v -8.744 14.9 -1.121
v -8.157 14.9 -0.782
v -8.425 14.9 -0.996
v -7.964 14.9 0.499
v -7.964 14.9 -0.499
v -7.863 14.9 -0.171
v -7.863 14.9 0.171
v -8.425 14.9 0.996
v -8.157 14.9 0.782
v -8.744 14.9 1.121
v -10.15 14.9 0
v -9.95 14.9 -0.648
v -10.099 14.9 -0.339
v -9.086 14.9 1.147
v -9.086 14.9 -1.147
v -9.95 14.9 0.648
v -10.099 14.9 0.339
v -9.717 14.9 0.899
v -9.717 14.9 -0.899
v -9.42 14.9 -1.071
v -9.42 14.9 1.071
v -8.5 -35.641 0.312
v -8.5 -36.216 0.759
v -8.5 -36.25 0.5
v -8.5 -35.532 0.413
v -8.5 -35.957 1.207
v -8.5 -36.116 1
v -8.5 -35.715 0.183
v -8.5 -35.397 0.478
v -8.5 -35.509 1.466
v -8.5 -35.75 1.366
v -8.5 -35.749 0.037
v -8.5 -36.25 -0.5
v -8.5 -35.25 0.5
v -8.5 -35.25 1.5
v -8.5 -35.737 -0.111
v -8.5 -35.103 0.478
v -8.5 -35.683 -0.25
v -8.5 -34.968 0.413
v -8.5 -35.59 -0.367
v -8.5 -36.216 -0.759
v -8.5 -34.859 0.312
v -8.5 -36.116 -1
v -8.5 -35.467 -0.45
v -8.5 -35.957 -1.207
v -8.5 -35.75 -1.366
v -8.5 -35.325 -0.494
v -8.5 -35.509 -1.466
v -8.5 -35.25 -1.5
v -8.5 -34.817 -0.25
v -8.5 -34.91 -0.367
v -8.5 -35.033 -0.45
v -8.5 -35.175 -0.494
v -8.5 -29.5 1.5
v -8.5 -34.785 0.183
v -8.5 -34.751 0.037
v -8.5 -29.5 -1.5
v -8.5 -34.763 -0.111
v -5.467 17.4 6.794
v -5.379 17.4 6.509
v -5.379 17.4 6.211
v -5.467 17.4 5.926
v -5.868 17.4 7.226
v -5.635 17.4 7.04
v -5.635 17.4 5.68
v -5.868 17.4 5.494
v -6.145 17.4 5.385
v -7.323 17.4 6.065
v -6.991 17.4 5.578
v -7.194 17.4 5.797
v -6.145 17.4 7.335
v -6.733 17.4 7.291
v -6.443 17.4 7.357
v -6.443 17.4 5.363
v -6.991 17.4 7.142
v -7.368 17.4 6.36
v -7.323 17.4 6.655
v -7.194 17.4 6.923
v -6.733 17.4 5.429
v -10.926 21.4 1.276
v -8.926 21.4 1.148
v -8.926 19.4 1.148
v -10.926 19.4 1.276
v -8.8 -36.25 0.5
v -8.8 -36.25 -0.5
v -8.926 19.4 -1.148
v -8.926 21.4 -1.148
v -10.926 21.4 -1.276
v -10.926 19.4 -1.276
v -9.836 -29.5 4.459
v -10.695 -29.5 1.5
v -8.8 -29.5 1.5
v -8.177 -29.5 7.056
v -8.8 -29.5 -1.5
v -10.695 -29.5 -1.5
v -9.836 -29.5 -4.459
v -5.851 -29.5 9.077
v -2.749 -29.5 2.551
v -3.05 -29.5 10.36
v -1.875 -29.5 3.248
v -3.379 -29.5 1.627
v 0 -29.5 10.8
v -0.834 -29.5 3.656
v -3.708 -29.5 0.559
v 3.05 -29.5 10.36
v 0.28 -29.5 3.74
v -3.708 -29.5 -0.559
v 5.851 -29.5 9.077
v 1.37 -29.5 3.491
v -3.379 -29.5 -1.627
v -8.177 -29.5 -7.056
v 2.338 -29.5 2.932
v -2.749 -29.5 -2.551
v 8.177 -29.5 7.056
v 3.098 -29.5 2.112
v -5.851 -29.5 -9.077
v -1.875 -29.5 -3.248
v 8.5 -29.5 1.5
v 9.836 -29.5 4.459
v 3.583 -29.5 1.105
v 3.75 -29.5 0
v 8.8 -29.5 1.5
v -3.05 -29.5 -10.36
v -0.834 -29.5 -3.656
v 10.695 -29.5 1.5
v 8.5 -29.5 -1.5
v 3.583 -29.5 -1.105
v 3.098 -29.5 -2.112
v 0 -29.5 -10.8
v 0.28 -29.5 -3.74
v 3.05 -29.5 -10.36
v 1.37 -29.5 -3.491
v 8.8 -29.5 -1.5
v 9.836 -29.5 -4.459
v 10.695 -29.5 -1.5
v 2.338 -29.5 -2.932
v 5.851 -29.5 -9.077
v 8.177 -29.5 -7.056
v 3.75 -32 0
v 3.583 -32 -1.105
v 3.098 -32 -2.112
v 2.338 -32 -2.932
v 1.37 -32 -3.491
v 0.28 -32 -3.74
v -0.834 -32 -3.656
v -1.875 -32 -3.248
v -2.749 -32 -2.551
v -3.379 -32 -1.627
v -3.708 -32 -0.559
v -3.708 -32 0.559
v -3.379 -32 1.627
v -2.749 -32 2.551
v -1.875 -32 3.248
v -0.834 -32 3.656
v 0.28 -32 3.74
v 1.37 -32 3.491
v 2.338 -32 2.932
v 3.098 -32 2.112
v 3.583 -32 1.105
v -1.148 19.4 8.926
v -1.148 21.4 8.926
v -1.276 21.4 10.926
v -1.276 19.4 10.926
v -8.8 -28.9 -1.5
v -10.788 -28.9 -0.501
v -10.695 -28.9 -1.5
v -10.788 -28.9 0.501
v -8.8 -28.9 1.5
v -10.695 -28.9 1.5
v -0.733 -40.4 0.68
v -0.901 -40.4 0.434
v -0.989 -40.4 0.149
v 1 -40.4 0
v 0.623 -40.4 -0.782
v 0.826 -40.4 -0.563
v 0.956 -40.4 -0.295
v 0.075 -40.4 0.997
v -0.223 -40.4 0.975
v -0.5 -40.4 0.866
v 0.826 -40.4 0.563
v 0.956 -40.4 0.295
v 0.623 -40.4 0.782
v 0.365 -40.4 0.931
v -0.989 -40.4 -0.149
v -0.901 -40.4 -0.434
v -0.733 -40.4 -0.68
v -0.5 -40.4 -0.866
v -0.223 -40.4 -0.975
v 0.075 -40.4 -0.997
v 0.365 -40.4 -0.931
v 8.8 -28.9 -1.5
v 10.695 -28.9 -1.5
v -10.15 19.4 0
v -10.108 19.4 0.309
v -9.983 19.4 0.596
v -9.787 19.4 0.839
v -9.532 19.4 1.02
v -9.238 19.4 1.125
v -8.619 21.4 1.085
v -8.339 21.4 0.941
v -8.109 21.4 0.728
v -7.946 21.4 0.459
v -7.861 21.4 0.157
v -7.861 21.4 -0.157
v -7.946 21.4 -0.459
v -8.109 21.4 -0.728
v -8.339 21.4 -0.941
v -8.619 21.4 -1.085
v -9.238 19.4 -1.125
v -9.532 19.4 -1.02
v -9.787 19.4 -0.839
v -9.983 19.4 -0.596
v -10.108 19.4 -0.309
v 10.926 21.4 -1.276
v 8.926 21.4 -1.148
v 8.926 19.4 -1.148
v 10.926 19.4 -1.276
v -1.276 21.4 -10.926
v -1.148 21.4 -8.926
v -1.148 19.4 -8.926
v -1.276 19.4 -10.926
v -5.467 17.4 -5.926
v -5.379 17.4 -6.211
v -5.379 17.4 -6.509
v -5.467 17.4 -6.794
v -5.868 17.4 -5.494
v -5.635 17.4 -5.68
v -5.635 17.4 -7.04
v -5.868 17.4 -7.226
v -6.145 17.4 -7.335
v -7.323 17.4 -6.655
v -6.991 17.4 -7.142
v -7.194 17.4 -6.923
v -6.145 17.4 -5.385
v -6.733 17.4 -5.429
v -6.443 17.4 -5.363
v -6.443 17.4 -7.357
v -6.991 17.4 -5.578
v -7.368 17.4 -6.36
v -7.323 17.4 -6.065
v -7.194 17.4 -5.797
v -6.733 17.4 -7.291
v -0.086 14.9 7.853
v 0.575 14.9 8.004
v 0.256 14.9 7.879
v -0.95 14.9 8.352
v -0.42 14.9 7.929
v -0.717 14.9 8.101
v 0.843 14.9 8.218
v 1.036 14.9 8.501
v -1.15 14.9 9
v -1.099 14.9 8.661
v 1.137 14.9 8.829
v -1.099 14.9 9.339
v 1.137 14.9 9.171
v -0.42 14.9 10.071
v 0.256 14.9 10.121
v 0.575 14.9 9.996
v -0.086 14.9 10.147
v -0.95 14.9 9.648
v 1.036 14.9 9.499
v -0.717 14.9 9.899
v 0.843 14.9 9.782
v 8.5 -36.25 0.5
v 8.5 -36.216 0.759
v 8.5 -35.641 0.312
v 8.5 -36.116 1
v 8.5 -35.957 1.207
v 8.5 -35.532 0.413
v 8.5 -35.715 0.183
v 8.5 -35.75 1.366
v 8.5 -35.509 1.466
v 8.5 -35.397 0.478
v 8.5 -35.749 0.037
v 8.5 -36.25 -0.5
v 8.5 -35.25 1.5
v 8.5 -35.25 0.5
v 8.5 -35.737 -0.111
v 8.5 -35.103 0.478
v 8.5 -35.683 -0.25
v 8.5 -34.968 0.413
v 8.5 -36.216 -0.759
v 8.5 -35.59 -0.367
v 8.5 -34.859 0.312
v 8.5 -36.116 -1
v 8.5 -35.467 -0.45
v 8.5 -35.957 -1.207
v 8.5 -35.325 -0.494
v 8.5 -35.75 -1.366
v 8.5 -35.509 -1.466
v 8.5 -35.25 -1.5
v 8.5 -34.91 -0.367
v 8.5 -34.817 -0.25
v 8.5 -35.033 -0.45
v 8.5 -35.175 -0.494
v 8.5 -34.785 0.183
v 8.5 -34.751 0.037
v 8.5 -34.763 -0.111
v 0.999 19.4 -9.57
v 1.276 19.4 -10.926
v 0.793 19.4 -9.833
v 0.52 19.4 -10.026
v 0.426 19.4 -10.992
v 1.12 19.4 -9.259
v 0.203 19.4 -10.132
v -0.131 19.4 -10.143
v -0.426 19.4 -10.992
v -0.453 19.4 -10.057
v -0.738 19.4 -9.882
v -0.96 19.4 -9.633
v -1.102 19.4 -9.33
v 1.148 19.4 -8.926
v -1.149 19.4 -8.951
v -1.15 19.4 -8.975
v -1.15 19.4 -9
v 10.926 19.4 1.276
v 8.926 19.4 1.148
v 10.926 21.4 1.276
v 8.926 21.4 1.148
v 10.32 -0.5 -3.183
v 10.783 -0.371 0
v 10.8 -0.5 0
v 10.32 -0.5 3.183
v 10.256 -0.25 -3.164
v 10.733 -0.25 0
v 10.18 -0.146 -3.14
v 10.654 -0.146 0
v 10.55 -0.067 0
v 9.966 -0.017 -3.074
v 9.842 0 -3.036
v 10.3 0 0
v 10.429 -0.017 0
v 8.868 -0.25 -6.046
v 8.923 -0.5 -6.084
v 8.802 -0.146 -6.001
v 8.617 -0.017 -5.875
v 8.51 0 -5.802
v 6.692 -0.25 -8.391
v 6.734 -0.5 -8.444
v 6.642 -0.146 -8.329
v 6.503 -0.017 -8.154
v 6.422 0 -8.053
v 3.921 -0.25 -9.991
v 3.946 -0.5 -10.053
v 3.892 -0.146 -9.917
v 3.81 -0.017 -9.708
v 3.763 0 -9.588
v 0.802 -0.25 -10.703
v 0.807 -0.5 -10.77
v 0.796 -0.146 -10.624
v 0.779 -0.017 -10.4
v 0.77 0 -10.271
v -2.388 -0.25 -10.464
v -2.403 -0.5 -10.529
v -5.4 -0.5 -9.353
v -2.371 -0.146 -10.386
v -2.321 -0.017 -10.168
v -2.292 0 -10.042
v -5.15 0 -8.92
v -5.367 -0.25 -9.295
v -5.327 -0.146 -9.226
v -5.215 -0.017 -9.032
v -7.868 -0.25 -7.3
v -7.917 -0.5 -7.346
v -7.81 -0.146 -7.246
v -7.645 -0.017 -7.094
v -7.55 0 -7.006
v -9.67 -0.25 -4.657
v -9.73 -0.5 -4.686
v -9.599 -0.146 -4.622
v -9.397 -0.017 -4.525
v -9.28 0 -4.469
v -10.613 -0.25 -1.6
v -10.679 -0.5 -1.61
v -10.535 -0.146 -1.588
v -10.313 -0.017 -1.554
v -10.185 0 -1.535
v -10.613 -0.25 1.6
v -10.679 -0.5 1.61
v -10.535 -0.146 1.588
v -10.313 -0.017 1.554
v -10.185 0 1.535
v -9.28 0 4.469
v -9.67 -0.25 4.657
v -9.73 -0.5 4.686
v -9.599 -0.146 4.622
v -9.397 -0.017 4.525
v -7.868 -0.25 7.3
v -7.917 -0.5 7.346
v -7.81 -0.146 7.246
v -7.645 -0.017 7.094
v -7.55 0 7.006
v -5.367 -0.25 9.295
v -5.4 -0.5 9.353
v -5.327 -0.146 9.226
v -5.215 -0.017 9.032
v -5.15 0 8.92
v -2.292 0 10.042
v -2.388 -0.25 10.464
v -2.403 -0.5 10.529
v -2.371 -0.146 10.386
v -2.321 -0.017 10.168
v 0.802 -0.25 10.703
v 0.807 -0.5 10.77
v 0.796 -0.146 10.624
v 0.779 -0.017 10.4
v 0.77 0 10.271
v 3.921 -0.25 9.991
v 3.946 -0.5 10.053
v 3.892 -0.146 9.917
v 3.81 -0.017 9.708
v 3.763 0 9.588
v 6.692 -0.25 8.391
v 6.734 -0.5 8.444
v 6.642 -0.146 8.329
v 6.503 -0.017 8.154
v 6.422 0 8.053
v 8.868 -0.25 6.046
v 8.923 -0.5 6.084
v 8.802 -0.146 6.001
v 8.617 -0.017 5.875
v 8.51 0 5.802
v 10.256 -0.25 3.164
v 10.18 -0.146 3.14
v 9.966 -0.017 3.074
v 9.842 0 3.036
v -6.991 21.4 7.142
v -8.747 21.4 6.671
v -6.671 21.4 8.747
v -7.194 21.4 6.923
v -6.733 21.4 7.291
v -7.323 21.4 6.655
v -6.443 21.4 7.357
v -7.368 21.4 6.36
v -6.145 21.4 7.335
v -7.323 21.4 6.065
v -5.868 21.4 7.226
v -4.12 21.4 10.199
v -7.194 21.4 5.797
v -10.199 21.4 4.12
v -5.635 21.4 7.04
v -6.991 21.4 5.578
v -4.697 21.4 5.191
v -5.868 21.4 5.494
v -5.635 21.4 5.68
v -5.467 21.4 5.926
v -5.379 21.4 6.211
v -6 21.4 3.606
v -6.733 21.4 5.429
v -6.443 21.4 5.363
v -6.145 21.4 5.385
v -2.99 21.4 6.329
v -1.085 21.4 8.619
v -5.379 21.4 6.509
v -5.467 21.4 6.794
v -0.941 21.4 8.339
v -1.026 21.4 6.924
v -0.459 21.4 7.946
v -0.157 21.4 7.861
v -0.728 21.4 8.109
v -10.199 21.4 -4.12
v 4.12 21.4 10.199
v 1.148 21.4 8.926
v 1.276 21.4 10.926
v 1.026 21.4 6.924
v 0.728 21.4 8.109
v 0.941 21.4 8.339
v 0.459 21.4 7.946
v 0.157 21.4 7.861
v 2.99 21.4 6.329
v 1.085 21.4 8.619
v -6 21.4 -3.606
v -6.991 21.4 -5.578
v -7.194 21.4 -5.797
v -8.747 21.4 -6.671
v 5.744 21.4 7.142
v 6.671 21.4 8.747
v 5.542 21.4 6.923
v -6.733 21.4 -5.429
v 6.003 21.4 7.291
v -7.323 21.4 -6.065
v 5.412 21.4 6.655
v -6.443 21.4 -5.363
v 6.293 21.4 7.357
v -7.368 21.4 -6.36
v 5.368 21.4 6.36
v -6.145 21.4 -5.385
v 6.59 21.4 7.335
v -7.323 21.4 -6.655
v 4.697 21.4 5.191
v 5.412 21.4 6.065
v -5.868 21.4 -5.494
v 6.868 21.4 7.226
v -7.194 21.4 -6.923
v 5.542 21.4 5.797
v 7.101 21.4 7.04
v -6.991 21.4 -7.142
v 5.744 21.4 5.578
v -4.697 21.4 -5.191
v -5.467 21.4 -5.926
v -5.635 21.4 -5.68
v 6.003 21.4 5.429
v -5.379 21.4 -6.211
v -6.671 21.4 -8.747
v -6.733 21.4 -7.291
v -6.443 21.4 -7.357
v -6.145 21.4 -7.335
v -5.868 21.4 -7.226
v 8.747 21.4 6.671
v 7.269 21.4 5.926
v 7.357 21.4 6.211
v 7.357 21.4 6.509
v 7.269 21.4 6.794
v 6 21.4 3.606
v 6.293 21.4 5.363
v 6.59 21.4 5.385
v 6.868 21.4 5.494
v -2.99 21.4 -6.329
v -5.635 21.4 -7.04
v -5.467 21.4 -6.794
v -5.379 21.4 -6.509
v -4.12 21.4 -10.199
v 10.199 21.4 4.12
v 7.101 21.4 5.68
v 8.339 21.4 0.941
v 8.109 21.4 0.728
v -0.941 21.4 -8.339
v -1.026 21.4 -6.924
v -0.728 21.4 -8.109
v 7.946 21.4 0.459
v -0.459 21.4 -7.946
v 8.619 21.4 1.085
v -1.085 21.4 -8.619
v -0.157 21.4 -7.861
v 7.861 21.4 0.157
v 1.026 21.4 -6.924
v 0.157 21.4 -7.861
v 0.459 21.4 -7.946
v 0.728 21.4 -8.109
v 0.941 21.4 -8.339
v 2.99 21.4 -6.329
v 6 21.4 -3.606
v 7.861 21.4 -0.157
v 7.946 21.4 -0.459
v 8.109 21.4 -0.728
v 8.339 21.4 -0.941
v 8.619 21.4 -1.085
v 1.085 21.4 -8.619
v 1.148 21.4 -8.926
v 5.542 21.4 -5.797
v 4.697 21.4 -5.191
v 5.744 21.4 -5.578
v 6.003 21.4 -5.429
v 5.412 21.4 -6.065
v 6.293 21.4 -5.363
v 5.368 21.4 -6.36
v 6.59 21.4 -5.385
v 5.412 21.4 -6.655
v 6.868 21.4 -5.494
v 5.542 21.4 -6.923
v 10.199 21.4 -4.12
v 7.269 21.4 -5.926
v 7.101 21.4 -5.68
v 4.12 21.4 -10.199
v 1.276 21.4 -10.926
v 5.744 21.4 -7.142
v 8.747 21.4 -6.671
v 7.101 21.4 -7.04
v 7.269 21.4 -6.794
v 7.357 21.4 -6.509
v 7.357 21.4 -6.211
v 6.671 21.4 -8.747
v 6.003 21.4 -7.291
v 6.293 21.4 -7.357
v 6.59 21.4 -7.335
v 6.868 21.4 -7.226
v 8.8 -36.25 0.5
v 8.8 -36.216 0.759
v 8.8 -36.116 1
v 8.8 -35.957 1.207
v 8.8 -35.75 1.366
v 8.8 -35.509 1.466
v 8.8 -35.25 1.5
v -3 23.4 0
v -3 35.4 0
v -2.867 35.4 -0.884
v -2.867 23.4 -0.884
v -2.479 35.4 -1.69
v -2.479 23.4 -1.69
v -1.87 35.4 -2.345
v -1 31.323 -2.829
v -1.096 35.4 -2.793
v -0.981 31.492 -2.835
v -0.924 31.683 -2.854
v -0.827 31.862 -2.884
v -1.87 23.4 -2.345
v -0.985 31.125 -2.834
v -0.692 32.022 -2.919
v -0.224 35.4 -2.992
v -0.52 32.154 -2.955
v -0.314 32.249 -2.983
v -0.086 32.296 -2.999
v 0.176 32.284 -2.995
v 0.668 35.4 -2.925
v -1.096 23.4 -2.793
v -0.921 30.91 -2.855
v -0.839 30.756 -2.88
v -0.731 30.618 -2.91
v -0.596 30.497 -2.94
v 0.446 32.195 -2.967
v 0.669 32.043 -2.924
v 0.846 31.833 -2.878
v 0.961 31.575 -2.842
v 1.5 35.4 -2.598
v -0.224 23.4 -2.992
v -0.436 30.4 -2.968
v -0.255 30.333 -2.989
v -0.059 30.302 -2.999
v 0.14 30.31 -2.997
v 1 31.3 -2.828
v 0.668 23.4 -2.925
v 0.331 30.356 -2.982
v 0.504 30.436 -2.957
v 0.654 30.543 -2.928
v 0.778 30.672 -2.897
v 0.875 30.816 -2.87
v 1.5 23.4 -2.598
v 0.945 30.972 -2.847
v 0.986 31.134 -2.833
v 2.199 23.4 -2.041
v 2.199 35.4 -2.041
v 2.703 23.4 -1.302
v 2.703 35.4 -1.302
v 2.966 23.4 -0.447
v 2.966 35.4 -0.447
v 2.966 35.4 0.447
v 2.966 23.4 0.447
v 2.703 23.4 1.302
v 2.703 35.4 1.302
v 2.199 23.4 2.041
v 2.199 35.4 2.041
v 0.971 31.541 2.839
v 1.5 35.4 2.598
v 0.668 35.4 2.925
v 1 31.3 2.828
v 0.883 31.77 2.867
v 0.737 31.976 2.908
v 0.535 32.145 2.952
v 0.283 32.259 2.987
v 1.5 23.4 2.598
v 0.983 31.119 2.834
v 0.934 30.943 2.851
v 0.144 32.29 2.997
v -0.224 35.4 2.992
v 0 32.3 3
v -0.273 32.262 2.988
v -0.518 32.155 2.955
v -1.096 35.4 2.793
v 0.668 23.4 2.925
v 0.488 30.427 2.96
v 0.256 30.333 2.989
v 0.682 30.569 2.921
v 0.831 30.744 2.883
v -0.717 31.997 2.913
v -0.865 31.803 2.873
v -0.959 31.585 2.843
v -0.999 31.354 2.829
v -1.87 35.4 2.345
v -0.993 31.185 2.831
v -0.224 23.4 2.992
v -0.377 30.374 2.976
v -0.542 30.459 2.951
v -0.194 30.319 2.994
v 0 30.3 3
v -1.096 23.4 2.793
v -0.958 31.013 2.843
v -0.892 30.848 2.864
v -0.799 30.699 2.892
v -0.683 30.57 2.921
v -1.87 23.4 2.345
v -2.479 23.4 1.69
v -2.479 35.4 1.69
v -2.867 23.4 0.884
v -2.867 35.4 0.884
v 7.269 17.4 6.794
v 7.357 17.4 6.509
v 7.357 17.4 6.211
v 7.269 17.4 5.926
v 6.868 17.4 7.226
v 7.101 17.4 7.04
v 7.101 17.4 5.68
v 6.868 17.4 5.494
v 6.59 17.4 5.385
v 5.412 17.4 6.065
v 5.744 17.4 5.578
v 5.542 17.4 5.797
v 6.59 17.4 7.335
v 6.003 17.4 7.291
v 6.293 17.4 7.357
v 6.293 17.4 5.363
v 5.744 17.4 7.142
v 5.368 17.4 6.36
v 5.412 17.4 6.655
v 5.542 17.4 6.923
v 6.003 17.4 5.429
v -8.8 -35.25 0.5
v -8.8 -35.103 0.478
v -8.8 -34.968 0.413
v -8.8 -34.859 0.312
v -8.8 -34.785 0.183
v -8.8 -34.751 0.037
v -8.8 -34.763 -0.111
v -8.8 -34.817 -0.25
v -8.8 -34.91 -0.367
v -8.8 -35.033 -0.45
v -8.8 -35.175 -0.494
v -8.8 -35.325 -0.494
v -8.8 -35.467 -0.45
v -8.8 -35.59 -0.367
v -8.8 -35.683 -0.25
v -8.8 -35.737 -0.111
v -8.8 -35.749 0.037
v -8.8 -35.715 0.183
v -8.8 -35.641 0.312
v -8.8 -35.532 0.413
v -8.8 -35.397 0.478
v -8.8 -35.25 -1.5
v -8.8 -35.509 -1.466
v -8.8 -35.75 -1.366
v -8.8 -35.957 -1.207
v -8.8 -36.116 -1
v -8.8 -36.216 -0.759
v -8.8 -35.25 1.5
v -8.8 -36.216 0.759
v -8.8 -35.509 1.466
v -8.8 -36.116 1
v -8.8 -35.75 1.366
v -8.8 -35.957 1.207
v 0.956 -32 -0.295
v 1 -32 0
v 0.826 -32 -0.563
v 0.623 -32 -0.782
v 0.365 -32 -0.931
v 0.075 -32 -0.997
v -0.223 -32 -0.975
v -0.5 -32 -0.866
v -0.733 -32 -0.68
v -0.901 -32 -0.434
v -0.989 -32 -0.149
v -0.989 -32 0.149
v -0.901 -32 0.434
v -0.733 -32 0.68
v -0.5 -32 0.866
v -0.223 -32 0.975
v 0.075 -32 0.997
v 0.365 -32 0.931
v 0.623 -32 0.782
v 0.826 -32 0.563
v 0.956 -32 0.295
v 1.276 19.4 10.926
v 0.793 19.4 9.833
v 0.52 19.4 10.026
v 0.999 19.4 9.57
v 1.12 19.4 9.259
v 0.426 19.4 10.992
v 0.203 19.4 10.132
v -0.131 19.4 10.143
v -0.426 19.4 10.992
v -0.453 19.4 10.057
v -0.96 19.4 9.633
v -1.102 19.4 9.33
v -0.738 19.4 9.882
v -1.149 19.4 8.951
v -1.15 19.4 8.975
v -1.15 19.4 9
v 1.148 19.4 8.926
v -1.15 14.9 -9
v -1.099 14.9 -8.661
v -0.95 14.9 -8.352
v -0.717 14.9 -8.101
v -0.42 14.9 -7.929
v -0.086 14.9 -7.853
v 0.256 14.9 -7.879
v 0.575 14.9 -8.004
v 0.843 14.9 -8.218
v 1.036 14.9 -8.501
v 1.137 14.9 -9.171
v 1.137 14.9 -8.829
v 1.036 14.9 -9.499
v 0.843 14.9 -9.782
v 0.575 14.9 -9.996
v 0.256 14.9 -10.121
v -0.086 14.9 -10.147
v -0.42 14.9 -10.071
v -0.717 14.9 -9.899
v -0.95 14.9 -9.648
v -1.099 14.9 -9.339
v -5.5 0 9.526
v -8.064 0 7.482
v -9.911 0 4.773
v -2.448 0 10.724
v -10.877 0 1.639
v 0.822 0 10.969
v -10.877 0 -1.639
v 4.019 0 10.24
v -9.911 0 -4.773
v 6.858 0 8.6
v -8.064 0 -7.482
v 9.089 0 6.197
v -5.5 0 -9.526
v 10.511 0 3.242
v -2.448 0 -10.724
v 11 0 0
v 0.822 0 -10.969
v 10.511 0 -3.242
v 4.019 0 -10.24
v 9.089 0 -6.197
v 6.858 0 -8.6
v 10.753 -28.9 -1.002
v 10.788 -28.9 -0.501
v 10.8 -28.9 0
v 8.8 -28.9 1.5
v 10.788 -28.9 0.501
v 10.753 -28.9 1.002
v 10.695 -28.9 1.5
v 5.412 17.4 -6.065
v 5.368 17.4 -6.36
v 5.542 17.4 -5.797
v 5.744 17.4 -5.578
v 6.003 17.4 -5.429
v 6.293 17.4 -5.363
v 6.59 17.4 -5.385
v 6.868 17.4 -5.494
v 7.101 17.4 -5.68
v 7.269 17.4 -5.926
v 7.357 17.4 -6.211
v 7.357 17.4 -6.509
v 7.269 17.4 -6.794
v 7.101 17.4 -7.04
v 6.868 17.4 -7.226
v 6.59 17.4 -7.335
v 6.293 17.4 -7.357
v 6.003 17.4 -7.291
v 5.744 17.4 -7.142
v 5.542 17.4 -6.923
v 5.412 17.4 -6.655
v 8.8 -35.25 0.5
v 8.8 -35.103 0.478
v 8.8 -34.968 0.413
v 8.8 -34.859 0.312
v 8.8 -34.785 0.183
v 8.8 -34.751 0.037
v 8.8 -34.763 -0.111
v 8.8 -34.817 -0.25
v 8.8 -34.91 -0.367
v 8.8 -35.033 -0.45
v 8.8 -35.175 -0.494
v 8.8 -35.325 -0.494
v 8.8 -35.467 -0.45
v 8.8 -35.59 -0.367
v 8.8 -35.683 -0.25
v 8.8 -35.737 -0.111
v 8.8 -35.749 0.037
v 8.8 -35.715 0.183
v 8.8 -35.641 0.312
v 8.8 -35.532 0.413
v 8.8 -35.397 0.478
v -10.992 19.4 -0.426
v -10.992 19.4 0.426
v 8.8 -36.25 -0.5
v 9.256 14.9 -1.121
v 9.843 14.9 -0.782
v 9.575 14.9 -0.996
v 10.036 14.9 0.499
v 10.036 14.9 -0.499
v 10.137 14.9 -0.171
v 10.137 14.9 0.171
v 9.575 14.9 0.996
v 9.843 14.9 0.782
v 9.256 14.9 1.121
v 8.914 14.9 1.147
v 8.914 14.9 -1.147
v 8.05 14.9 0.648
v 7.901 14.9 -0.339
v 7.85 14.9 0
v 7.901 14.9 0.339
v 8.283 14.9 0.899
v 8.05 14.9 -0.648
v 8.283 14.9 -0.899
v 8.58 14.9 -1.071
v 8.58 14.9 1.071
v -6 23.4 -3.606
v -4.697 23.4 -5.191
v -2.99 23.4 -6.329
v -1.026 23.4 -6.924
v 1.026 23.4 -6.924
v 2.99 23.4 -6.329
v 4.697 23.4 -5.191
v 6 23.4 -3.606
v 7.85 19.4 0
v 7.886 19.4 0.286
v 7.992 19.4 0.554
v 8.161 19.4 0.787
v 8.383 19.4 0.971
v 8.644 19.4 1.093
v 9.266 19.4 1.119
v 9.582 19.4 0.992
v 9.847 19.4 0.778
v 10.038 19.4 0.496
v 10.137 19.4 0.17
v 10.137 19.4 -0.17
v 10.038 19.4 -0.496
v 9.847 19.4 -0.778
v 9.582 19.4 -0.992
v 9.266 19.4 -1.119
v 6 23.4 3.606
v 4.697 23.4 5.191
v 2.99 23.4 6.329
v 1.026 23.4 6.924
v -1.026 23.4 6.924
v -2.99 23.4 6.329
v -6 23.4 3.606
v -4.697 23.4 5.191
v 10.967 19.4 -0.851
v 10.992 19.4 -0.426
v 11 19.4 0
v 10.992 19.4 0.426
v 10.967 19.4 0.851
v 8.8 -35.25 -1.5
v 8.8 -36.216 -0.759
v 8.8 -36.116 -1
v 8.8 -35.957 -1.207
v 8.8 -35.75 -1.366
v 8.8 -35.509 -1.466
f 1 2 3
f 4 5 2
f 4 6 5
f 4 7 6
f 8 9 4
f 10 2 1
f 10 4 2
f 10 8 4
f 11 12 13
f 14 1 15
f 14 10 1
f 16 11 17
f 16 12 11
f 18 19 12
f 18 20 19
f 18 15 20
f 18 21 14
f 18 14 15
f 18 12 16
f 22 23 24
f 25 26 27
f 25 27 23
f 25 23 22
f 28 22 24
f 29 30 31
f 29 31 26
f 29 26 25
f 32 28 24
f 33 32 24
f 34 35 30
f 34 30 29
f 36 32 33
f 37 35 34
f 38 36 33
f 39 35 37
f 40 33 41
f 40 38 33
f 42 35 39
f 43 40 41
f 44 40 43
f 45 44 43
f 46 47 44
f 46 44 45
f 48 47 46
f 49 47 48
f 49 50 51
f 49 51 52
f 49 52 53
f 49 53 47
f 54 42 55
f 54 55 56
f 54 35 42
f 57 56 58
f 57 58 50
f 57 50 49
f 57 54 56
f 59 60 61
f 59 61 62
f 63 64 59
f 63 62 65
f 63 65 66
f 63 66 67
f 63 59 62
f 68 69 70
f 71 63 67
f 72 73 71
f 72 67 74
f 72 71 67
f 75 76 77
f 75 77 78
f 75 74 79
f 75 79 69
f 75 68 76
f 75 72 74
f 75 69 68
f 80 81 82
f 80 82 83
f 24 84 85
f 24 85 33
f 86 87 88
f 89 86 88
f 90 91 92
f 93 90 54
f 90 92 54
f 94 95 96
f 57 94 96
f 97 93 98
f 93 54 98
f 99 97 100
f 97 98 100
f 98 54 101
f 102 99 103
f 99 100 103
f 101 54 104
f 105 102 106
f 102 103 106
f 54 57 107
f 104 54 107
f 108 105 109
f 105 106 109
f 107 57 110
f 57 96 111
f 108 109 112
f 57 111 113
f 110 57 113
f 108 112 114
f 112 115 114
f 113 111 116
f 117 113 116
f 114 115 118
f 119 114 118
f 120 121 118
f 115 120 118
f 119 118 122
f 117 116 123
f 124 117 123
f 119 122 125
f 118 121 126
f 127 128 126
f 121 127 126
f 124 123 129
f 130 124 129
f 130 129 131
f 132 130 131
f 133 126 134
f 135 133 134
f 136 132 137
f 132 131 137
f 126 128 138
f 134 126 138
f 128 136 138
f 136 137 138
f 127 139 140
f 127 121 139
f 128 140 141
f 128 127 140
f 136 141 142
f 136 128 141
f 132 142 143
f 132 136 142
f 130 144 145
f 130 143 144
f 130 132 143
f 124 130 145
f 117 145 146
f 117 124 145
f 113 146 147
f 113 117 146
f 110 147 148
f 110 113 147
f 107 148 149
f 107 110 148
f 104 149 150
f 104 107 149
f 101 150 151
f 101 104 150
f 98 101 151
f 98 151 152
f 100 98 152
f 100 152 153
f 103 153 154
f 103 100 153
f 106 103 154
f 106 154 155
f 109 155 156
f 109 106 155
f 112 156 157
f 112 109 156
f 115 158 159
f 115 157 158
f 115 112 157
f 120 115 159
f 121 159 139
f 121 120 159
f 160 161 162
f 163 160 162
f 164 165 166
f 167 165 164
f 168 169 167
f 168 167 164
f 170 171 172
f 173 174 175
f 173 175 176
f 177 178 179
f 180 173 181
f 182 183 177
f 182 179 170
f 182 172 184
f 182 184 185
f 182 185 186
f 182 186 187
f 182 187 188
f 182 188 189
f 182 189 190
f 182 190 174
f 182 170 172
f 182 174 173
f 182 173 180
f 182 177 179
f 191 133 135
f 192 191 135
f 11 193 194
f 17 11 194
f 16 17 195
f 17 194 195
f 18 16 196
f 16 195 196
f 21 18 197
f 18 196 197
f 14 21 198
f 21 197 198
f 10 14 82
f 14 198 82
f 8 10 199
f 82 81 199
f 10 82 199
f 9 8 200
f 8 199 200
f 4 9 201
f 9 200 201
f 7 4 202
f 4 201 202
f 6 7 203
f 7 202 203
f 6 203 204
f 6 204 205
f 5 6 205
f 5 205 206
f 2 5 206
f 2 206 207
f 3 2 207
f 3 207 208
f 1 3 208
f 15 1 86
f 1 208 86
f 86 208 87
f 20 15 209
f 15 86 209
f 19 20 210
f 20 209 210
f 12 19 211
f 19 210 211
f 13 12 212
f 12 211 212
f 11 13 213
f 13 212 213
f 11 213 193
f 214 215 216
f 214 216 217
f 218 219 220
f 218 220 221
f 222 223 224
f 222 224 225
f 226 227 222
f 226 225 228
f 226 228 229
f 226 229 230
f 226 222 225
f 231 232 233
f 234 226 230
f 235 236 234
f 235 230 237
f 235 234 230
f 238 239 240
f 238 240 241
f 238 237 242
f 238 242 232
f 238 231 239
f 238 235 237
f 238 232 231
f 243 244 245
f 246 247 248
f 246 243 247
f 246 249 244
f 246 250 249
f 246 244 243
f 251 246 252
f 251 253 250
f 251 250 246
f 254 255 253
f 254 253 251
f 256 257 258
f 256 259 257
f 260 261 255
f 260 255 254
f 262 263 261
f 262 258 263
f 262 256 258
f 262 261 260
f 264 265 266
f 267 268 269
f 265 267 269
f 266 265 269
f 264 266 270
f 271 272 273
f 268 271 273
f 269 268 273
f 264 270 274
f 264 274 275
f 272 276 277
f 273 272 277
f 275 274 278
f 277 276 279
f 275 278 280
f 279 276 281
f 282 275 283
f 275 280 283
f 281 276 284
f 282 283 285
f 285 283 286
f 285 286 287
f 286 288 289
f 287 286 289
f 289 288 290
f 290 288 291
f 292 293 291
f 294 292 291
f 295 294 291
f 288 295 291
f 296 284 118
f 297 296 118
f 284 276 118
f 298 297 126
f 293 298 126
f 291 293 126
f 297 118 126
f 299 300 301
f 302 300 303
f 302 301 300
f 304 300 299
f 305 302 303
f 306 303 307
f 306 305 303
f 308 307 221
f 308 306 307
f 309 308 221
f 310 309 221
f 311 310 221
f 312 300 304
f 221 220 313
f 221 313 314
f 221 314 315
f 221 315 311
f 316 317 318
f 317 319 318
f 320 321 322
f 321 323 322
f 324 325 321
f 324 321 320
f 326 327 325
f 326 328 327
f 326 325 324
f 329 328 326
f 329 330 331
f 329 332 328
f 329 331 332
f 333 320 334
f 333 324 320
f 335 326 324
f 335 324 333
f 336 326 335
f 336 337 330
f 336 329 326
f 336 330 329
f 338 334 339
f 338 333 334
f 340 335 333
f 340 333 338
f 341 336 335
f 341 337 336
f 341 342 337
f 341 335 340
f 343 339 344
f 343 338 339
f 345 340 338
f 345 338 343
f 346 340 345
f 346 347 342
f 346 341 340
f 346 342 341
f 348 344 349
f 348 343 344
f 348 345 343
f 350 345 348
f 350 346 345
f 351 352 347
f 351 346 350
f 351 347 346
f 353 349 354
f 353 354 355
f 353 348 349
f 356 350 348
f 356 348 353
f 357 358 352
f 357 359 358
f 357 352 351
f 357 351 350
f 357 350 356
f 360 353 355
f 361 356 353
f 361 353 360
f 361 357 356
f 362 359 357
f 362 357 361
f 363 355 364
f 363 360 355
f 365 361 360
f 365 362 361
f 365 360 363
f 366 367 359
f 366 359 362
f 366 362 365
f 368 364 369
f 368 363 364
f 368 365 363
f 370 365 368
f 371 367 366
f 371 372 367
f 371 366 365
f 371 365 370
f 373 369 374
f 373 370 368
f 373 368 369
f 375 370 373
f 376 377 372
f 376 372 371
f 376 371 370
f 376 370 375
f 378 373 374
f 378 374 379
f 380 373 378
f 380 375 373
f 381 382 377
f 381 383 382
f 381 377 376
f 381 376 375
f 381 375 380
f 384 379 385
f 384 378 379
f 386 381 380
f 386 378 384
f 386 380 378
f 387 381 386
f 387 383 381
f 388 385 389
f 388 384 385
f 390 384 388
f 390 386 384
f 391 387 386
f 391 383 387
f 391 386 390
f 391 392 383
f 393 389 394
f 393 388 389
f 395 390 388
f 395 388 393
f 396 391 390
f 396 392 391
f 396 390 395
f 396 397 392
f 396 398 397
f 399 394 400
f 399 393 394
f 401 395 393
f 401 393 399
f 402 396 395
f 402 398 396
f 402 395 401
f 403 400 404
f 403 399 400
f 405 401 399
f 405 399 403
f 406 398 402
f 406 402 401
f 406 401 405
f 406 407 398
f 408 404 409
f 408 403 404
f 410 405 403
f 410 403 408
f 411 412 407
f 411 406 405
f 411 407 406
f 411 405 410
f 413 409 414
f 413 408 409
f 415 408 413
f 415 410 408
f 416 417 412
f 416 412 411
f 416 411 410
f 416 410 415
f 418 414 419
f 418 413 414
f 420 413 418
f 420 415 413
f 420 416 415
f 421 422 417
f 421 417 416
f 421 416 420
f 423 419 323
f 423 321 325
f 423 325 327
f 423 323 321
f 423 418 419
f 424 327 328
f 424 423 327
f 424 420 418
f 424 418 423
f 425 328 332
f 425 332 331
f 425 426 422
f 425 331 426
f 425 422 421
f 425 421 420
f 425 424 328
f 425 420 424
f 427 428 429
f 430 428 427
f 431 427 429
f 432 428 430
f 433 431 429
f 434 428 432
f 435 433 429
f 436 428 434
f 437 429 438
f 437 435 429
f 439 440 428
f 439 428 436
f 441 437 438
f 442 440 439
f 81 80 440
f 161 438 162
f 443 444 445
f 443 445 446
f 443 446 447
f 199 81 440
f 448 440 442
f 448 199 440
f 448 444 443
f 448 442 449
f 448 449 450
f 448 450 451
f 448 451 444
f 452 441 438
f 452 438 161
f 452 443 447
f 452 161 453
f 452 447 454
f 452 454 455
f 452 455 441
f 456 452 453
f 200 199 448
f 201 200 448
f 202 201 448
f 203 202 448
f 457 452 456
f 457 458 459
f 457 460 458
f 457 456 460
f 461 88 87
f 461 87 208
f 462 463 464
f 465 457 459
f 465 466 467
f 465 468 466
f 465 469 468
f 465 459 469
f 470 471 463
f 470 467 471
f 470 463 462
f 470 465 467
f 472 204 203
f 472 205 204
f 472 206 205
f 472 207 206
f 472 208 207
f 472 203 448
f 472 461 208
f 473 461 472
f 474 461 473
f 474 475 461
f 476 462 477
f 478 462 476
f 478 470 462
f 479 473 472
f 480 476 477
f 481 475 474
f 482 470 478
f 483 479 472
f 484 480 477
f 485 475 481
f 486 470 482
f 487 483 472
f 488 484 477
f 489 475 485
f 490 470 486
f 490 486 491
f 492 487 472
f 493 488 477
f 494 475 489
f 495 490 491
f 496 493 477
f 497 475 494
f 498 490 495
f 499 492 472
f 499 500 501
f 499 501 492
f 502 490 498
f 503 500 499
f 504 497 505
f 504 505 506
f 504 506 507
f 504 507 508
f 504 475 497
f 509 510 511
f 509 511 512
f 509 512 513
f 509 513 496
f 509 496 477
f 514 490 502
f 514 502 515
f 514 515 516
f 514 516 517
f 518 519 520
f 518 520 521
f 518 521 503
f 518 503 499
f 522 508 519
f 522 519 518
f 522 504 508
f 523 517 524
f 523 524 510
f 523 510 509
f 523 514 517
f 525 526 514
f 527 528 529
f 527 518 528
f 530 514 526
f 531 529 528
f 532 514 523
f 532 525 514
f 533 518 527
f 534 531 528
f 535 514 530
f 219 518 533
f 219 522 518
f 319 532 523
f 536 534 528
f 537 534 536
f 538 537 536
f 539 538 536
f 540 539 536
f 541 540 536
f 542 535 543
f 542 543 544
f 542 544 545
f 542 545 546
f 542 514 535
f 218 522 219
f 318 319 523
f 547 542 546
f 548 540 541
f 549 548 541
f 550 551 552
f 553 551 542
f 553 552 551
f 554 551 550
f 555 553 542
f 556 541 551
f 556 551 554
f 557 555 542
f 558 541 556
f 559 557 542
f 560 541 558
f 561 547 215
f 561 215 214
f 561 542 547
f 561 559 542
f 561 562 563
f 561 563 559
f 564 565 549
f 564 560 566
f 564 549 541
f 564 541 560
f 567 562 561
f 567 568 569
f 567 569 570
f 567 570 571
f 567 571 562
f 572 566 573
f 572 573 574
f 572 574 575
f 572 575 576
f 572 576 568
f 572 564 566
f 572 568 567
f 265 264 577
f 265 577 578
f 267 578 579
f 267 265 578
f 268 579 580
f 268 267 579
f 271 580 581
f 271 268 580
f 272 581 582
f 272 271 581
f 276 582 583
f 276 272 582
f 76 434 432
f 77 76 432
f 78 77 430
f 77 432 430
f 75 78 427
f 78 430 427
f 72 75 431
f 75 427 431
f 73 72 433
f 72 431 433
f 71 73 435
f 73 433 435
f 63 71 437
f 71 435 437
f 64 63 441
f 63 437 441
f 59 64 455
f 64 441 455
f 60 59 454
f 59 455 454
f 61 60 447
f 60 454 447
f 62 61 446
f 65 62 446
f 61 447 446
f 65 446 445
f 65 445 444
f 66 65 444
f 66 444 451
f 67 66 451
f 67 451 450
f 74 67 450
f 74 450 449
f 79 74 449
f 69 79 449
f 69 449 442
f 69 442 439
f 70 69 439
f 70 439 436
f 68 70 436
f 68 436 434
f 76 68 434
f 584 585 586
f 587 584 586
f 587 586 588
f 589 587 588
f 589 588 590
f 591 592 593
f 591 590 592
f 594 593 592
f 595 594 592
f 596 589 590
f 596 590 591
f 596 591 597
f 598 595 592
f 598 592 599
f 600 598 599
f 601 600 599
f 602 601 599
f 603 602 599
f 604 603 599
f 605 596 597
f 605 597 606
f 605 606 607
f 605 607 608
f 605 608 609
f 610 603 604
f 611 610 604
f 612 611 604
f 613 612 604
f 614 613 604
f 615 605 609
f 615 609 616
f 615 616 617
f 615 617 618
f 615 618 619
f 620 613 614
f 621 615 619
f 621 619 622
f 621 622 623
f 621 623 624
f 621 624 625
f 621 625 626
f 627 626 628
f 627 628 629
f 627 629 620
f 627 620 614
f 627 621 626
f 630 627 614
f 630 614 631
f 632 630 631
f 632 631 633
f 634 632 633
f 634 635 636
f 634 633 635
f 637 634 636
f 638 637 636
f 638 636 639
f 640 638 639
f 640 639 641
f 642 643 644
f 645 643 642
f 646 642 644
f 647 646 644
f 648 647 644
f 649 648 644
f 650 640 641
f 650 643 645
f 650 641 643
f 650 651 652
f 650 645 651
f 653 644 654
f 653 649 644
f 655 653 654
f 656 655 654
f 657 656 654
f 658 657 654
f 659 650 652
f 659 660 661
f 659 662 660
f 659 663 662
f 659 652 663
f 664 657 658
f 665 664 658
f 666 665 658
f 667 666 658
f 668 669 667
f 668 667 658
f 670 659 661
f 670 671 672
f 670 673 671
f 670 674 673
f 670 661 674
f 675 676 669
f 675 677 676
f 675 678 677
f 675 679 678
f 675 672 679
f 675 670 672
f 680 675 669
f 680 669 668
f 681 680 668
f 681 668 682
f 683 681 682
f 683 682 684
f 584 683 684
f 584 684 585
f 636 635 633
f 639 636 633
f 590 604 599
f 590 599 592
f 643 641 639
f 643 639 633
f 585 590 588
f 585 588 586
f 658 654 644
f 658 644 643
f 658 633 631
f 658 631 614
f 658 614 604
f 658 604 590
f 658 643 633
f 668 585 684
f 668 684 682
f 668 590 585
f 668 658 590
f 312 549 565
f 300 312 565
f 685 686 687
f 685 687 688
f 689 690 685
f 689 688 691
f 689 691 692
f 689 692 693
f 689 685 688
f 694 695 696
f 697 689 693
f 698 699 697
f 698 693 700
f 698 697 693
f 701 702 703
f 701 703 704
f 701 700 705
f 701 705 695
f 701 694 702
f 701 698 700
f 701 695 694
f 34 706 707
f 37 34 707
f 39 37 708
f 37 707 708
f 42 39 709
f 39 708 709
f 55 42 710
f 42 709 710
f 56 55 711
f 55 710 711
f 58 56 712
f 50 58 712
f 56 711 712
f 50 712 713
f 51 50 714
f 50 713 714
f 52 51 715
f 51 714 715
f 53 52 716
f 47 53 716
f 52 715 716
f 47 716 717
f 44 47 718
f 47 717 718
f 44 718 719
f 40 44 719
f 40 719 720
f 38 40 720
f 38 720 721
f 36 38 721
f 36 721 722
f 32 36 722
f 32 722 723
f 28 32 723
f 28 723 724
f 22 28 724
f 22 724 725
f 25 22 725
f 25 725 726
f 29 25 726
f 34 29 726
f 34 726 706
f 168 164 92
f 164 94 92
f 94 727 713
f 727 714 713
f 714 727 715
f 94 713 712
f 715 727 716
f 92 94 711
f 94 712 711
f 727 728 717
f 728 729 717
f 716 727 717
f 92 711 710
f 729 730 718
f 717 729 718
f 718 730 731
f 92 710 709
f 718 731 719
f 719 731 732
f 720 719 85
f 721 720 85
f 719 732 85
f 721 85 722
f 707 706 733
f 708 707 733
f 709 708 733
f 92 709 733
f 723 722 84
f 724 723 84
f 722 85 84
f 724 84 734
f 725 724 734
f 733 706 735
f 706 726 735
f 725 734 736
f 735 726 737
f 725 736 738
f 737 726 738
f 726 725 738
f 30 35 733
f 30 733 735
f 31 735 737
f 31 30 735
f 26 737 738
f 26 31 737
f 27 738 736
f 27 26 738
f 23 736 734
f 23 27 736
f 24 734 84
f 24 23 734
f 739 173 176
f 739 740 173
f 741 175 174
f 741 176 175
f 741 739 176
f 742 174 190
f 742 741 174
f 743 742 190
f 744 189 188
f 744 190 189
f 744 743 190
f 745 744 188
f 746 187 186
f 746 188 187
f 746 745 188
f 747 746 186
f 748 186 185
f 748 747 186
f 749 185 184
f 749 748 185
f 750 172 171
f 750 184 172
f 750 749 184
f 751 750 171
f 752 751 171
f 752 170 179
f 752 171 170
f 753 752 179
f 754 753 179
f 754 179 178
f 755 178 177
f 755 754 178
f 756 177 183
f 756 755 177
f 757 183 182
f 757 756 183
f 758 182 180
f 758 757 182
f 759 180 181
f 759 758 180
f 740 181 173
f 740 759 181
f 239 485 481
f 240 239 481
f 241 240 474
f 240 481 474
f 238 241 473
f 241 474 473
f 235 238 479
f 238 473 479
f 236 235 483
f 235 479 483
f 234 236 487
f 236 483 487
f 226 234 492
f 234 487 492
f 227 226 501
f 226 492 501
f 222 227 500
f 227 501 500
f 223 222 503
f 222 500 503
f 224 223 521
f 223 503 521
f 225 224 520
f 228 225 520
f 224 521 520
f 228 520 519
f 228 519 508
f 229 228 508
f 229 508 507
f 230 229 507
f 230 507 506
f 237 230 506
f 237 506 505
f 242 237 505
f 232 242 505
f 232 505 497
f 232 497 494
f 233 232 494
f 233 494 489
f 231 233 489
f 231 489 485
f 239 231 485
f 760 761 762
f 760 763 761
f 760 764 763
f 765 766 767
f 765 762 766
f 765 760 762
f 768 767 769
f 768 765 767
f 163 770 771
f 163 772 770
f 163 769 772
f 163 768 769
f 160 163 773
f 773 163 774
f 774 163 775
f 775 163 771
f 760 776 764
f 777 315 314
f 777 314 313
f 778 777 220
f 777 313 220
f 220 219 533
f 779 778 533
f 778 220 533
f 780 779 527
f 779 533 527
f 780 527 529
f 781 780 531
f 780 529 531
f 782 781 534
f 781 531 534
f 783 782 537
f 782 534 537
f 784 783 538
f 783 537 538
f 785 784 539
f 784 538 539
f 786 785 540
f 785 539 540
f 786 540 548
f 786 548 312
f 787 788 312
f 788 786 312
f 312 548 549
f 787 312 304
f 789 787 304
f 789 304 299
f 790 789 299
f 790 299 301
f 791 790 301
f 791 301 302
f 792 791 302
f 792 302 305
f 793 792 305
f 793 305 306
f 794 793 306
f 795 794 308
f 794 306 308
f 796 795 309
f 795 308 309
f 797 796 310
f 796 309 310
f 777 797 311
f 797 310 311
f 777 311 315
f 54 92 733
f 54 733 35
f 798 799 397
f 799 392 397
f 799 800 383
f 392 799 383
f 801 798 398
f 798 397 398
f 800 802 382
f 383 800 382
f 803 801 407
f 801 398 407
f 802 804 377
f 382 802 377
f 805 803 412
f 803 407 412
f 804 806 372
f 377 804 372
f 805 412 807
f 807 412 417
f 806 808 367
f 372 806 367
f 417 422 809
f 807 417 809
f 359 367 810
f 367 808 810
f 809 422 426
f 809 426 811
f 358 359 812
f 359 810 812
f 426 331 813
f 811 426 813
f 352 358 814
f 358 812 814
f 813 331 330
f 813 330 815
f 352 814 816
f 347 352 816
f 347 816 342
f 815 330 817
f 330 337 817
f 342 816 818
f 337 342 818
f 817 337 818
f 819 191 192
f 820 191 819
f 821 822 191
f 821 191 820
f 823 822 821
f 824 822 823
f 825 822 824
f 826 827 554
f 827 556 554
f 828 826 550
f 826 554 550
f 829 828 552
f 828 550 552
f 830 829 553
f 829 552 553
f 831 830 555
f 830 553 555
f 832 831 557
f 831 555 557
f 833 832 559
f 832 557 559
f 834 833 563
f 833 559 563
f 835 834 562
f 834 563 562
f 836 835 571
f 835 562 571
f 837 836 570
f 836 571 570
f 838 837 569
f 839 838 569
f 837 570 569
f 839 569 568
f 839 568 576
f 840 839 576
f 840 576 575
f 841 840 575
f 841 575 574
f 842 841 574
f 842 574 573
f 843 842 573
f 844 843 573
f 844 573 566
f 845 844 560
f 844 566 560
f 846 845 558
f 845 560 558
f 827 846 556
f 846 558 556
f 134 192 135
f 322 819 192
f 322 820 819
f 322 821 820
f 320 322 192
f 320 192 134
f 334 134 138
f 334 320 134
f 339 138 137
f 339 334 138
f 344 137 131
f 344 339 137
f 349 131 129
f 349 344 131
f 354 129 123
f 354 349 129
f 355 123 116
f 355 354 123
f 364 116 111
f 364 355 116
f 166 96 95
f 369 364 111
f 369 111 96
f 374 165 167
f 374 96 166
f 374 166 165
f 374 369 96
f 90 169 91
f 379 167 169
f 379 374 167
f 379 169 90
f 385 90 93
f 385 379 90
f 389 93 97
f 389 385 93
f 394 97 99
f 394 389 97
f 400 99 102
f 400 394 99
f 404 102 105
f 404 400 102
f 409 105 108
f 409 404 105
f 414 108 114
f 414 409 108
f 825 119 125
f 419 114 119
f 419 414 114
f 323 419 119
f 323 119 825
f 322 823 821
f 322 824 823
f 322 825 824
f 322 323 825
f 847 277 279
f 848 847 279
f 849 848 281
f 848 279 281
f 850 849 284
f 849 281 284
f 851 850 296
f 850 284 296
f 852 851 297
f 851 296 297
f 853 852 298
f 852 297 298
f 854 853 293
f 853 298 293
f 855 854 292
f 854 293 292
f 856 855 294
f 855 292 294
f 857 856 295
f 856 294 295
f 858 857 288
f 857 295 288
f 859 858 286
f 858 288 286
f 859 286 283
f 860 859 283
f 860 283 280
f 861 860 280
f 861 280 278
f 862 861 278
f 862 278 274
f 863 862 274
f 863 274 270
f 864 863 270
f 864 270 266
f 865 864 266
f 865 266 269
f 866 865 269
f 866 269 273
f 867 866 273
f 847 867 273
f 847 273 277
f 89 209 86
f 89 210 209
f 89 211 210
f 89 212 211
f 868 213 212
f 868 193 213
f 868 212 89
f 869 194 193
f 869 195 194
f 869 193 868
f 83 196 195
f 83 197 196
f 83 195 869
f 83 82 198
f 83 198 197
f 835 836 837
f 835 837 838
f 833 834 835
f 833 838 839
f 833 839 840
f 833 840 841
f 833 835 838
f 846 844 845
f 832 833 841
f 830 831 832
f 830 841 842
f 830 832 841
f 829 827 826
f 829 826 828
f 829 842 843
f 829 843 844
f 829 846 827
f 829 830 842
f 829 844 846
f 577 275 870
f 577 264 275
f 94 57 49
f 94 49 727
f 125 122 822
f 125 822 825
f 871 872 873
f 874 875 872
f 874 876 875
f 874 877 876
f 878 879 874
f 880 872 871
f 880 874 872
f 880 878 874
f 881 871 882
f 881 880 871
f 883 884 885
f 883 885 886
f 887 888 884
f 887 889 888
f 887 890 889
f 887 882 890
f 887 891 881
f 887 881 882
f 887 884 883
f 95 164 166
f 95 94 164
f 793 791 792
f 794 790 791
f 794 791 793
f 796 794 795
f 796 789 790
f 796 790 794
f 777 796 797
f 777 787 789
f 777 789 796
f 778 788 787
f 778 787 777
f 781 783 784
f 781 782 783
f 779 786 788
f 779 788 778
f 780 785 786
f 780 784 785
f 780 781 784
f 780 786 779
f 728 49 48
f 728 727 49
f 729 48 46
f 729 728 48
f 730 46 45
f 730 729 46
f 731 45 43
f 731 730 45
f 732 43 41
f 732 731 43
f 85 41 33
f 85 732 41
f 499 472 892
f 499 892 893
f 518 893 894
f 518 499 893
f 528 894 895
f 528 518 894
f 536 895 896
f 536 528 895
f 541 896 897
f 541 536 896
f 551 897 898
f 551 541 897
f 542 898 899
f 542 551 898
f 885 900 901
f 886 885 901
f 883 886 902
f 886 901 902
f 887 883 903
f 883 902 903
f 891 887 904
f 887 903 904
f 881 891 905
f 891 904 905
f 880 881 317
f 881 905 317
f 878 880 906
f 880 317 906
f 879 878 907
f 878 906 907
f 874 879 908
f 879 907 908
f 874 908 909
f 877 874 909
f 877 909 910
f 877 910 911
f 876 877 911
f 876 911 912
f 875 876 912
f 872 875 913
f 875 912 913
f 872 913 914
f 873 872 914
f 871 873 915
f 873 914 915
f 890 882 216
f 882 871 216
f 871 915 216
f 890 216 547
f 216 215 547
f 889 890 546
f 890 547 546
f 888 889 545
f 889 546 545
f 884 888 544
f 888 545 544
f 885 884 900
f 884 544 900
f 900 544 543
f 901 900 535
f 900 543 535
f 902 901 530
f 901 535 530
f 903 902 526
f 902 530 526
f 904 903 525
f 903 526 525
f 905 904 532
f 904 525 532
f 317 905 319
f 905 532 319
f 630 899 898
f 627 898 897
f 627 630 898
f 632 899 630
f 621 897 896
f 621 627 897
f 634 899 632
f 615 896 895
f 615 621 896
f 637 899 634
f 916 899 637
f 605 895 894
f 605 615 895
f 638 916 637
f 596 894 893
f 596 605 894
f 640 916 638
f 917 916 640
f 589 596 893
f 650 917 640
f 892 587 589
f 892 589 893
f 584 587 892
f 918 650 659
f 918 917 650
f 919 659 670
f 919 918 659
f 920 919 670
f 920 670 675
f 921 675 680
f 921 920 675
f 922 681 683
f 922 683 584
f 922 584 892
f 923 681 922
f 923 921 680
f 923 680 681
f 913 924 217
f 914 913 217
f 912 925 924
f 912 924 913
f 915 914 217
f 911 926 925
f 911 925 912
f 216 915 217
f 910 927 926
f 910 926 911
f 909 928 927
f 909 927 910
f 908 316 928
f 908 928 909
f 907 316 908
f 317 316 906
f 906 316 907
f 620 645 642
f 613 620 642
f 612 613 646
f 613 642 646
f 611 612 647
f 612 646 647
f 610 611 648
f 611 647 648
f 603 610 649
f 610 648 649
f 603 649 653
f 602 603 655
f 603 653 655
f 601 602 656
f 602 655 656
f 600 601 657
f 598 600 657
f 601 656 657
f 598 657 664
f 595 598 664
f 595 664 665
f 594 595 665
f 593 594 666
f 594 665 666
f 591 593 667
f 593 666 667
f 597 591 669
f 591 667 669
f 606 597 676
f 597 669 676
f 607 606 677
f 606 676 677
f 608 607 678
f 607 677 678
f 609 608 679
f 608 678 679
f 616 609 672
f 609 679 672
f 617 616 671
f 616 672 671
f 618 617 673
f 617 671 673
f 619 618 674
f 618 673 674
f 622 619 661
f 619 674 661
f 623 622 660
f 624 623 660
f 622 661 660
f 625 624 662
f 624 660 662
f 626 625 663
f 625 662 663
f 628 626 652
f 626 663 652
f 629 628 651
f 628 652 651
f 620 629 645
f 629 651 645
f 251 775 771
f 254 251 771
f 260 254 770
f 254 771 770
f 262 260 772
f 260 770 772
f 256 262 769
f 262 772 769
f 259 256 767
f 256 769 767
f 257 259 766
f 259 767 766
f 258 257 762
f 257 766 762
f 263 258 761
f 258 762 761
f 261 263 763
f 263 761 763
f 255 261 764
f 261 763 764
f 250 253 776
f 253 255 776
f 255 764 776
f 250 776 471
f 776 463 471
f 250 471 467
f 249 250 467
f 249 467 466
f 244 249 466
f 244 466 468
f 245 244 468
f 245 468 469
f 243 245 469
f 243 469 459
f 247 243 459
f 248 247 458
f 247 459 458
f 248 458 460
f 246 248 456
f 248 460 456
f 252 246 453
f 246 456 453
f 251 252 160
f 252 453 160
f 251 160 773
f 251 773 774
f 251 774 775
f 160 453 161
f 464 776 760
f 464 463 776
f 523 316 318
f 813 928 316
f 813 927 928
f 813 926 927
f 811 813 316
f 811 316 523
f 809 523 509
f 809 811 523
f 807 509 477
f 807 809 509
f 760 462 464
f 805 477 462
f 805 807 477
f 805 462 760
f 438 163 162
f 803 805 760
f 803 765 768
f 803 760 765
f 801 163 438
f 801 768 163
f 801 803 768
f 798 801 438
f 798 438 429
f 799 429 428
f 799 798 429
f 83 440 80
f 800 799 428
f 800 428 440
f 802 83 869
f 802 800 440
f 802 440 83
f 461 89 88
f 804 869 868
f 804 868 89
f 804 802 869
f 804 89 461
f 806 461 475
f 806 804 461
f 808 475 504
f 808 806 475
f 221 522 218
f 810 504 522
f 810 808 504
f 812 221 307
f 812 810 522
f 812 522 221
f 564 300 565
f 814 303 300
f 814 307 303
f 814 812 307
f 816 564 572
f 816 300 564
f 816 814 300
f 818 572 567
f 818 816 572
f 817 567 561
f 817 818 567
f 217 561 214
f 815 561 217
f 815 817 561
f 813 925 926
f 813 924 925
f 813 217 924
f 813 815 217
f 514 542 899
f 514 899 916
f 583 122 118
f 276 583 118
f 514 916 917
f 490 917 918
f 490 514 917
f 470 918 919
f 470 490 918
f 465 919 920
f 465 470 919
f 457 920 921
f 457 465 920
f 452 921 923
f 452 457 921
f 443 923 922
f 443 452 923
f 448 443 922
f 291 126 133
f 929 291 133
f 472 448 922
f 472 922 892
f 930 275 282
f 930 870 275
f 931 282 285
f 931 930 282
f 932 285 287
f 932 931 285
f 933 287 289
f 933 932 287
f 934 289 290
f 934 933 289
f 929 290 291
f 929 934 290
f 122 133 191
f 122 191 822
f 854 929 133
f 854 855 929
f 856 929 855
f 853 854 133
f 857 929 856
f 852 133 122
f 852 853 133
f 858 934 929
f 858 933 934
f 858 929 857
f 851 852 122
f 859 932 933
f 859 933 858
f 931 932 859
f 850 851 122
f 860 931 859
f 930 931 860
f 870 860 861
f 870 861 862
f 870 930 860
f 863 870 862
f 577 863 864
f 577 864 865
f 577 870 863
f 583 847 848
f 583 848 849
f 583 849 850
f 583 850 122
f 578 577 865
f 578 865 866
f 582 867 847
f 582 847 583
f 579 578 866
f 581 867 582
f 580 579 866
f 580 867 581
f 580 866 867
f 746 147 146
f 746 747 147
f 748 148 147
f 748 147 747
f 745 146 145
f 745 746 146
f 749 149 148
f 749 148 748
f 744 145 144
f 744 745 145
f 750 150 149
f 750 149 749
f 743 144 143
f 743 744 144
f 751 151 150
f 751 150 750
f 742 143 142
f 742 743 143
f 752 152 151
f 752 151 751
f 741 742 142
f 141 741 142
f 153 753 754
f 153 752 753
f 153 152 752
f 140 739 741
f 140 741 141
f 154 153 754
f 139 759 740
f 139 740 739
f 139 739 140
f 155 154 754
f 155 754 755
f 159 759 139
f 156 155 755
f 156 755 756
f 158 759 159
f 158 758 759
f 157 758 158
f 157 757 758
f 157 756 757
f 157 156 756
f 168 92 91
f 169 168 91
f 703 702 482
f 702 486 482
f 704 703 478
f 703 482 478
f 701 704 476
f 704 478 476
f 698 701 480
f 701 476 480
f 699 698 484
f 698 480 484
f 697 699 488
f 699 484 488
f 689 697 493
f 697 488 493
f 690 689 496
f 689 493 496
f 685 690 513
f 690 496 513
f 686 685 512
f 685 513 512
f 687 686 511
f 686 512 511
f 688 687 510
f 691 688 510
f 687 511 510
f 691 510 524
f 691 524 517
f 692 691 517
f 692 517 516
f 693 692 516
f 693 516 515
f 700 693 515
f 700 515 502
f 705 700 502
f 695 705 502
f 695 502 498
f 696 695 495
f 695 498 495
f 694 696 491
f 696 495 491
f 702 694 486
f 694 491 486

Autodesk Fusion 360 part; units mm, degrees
sketch "Sketch1" plane through (0, 0, 0) normal (0, 1, 0) x (1, 0, 0)
  circle A0 centre (0, 0) radius 11
  circle A1 centre (0, 0) radius 10.8
  dimension "d1" = 22
  dimension "d4" = 21.6
extrude "Extrude1" add sketch "Sketch1" along normal blind 21.4 contours A0 | A1 makes body 1
extrude "Extrude2" add sketch "Sketch1" against normal blind 29.5 separate body contours A1 makes body 2
sketch "Sketch2" plane through (0, -29.5, 0) normal (0, -1, 0) x (1, 0, 0)
  circle A0 centre (0, 0) radius 10.8
  circle A1 centre (0, 0) radius 3.75
  circle A2 centre (0, 0) radius 1
  dimension "d7" = 7.5
  dimension "d8" = 2
extrude "Extrude3" add sketch "Sketch2" along normal blind 2.5 contours A1 | A2 bodies 2
sketch "Sketch3" plane through (0, -29.5, 0) normal (0, -1, 0) x (1, 0, 0)
  circle A0 centre (0, 0) radius 3.75
  circle A1 centre (0, 0) radius 10.8
  line L0 (0, 0) -> (10.8, 0) construction
  line L1 (0, 0) -> (0, 10.8) construction
  line L2 (8.5, -1.5) -> (8.8, -1.5)
  line L3 (8.8, -1.5) -> (8.8, 1.5)
  line L4 (8.8, 1.5) -> (8.5, 1.5)
  line L5 (8.5, 1.5) -> (8.5, -1.5)
  line L6 (8.5, -1.5) -> (8.8, 1.5) construction
  line L7 (8.8, -1.5) -> (8.5, 1.5) construction
  line L8 (-8.8, -1.5) -> (-8.5, 1.5) construction
  line L9 (-8.5, 1.5) -> (-8.5, -1.5)
  line L10 (-8.8, -1.5) -> (-8.8, 1.5)
  line L11 (0, 0) -> (-10.8, 0) construction
  line L12 (-8.5, -1.5) -> (-8.8, 1.5) construction
  line L13 (-8.8, 1.5) -> (-8.5, 1.5)
  line L14 (-8.5, -1.5) -> (-8.8, -1.5)
  line L15 (-8.8, 1.5) -> (-10.6953, 1.5)
  line L16 (-8.8, -1.5) -> (-10.6953, -1.5)
  circle A2 centre (0, 0) radius 10.8
  line L17 (8.8, 1.5) -> (10.6953, 1.5)
  line L18 (8.8, -1.5) -> (10.6953, -1.5)
  point P0 (8.65, 0)
  dimension "d14" = 0.3
  dimension "d15" = 3
  dimension "d16" = 2
extrude "Extrude5" add sketch "Sketch3" along normal blind 6.75 contours L2 L3 L4 L5 | L9 L10 L13 L14 bodies 2
sketch "Sketch4" plane through (-8.8, 0, 0) normal (-1, 0, 0) x (0, 0, 1)
  line L0 (1.5, -29.5) -> (-1.5, -29.5)
  line L1 (-1.5, -29.5) -> (-1.5, -36.25)
  line L2 (-1.5, -36.25) -> (1.5, -36.25)
  line L3 (1.5, -36.25) -> (1.5, -29.5)
  circle A0 centre (0, -35.25) radius 0.5
  dimension "d19" = 1
  dimension "d20" = 1
  dimension "d21" = 1.5
extrude "Extrude6" cut sketch "Sketch4" against normal blind 1000 contours A0 bodies 2
fillet "Fillet1" radius 1 4 edges at (-8.65, -36.25, -1.5) (-8.65, -36.25, 1.5) (8.65, -36.25, 1.5) (8.65, -36.25, -1.5) on bodies 2
extrude "Extrude7" add sketch "Sketch2" along normal blind 8.4 from surface at 2.5 separate body contours A2 makes body 3
sketch "Sketch5" plane through (0, 21.4, 0) normal (0, 1, 0) x (-1, 0, 0)
  circle A0 centre (0, 0) radius 11
  line L0 (6, -3.625) -> (-6, -3.625)
  line L1 (-6, -3.625) -> (-6, 3.625)
  line L2 (-6, 3.625) -> (6, 3.625)
  line L3 (6, 3.625) -> (6, -3.625)
  line L4 (6, -3.625) -> (-6, 3.625) construction
  line L5 (-6, -3.625) -> (6, 3.625) construction
  line L6 (6, -3.625) -> (6, 3.625)
  arc A1 (-6, -3.6056) -> (6, -3.6056) centre (0, 0) ccw
  arc A2 (6, 3.6056) -> (-6, 3.6056) centre (0, 0) ccw
  circle A3 centre (0, 0) radius 3
  circle A4 centre (0, 0) radius 9
  line L7 (0, 0) -> (0, -11) construction
  line L8 (0, 0) -> (0, 11) construction
  line L9 (0, 0) -> (-11, 0) construction
  line L10 (0, 0) -> (11, 0) construction
  circle A5 centre (9, 0) radius 1.15
  circle A6 centre (0, 9) radius 1.15
  circle A7 centre (-9, 0) radius 1.15
  circle A8 centre (0, -9) radius 1.15
  line L11 (8.9265, -1.1477) -> (10.9258, -1.2756)
  line L12 (8.9265, 1.1477) -> (10.9258, 1.2756)
  line L13 (-8.9265, -1.1477) -> (-10.9258, -1.2756)
  line L14 (-8.9265, 1.1477) -> (-10.9258, 1.2756)
  line L15 (-1.1477, -8.9265) -> (-1.2756, -10.9258)
  line L16 (1.1477, -8.9265) -> (1.2756, -10.9258)
  line L17 (1.1477, 8.9265) -> (1.2756, 10.9258)
  line L18 (-1.1477, 8.9265) -> (-1.2756, 10.9258)
  line L19 (0, 0) -> (-6.3679, 6.36) construction
  circle A9 centre (-6.3679, 6.36) radius 1
  circle A10 centre (6.3679, 6.36) radius 1
  circle A11 centre (-6.3679, -6.36) radius 1
  circle A12 centre (6.3679, -6.36) radius 1
  dimension "d32" = 14
  dimension "d33" = 12
  dimension "d34" = 7.25
  dimension "d37" = 6
  dimension "d40" = 18
  dimension "d41" = 2.3
  dimension "d42" = 2.3
  dimension "d43" = 2.3
  dimension "d44" = 2.3
  dimension "d49" = 2
extrude "Extrude8" add sketch "Sketch5" along normal blind 2 contours L0 A1 | L0 L1 L2 L3 L6 A1 A2 | L2 A2 | A3 bodies 1
extrude "Extrude9" add sketch "Sketch5" along normal blind 14 contours A3 bodies 1
extrude "Extrude10" cut sketch "Sketch5" against normal blind 2 contours A0 A5 L11 L12 | A0 A6 L17 L18 | A4 A5 | A4 A5 | A0 A8 L15 L16 | A4 A6 | A4 A6 | A4 A8 | A4 A8 | A0 A7 L13 L14 | A4 A7 | A4 A7 bodies 1
extrude "Extrude11" cut sketch "Sketch5" against normal blind 6.5 contours A4 A5 | A4 A5 | A4 A6 | A4 A6 | A4 A8 | A4 A8 | A4 A7 | A4 A7 bodies 1
extrude "Extrude12" cut sketch "Sketch5" against normal blind 4 contours A4 A10 | A4 A10 | A4 A12 | A4 A12 | A4 A9 | A4 A9 | A4 A11 | A4 A11 bodies 1
ref_plane "WorkPlane1" through (0, 31.7967, 3) normal (0, 0, 1) x (-1, 0, 0)
sketch "Sketch6" plane through (0, 0, 3) normal (0, 0, 1) x (1, 0, 0)
  line L0 (3, 35.4) -> (-3, 35.4)
  line L1 (-3, 23.4) -> (3, 23.4)
  circle A0 centre (0, 31.3) radius 1
  dimension "d53" = 2
  dimension "d54" = 4.1
extrude "Extrude13" cut sketch "Sketch6" against normal blind 99 bodies 1
fillet "Fillet2" radius 0.5 1 edges at (-10.0691, 0, 3.9054) on bodies 2
extrude "Extrude14" cut sketch "Sketch3" against normal blind 0.6 contours A1 L3 A2 L17 L18 | A1 L10 L15 L16 A2 bodies 2
combine "Combine1" operation add target body 2 tool bodies 3
combine "Combine2" operation add target body 1 tool bodies 2
